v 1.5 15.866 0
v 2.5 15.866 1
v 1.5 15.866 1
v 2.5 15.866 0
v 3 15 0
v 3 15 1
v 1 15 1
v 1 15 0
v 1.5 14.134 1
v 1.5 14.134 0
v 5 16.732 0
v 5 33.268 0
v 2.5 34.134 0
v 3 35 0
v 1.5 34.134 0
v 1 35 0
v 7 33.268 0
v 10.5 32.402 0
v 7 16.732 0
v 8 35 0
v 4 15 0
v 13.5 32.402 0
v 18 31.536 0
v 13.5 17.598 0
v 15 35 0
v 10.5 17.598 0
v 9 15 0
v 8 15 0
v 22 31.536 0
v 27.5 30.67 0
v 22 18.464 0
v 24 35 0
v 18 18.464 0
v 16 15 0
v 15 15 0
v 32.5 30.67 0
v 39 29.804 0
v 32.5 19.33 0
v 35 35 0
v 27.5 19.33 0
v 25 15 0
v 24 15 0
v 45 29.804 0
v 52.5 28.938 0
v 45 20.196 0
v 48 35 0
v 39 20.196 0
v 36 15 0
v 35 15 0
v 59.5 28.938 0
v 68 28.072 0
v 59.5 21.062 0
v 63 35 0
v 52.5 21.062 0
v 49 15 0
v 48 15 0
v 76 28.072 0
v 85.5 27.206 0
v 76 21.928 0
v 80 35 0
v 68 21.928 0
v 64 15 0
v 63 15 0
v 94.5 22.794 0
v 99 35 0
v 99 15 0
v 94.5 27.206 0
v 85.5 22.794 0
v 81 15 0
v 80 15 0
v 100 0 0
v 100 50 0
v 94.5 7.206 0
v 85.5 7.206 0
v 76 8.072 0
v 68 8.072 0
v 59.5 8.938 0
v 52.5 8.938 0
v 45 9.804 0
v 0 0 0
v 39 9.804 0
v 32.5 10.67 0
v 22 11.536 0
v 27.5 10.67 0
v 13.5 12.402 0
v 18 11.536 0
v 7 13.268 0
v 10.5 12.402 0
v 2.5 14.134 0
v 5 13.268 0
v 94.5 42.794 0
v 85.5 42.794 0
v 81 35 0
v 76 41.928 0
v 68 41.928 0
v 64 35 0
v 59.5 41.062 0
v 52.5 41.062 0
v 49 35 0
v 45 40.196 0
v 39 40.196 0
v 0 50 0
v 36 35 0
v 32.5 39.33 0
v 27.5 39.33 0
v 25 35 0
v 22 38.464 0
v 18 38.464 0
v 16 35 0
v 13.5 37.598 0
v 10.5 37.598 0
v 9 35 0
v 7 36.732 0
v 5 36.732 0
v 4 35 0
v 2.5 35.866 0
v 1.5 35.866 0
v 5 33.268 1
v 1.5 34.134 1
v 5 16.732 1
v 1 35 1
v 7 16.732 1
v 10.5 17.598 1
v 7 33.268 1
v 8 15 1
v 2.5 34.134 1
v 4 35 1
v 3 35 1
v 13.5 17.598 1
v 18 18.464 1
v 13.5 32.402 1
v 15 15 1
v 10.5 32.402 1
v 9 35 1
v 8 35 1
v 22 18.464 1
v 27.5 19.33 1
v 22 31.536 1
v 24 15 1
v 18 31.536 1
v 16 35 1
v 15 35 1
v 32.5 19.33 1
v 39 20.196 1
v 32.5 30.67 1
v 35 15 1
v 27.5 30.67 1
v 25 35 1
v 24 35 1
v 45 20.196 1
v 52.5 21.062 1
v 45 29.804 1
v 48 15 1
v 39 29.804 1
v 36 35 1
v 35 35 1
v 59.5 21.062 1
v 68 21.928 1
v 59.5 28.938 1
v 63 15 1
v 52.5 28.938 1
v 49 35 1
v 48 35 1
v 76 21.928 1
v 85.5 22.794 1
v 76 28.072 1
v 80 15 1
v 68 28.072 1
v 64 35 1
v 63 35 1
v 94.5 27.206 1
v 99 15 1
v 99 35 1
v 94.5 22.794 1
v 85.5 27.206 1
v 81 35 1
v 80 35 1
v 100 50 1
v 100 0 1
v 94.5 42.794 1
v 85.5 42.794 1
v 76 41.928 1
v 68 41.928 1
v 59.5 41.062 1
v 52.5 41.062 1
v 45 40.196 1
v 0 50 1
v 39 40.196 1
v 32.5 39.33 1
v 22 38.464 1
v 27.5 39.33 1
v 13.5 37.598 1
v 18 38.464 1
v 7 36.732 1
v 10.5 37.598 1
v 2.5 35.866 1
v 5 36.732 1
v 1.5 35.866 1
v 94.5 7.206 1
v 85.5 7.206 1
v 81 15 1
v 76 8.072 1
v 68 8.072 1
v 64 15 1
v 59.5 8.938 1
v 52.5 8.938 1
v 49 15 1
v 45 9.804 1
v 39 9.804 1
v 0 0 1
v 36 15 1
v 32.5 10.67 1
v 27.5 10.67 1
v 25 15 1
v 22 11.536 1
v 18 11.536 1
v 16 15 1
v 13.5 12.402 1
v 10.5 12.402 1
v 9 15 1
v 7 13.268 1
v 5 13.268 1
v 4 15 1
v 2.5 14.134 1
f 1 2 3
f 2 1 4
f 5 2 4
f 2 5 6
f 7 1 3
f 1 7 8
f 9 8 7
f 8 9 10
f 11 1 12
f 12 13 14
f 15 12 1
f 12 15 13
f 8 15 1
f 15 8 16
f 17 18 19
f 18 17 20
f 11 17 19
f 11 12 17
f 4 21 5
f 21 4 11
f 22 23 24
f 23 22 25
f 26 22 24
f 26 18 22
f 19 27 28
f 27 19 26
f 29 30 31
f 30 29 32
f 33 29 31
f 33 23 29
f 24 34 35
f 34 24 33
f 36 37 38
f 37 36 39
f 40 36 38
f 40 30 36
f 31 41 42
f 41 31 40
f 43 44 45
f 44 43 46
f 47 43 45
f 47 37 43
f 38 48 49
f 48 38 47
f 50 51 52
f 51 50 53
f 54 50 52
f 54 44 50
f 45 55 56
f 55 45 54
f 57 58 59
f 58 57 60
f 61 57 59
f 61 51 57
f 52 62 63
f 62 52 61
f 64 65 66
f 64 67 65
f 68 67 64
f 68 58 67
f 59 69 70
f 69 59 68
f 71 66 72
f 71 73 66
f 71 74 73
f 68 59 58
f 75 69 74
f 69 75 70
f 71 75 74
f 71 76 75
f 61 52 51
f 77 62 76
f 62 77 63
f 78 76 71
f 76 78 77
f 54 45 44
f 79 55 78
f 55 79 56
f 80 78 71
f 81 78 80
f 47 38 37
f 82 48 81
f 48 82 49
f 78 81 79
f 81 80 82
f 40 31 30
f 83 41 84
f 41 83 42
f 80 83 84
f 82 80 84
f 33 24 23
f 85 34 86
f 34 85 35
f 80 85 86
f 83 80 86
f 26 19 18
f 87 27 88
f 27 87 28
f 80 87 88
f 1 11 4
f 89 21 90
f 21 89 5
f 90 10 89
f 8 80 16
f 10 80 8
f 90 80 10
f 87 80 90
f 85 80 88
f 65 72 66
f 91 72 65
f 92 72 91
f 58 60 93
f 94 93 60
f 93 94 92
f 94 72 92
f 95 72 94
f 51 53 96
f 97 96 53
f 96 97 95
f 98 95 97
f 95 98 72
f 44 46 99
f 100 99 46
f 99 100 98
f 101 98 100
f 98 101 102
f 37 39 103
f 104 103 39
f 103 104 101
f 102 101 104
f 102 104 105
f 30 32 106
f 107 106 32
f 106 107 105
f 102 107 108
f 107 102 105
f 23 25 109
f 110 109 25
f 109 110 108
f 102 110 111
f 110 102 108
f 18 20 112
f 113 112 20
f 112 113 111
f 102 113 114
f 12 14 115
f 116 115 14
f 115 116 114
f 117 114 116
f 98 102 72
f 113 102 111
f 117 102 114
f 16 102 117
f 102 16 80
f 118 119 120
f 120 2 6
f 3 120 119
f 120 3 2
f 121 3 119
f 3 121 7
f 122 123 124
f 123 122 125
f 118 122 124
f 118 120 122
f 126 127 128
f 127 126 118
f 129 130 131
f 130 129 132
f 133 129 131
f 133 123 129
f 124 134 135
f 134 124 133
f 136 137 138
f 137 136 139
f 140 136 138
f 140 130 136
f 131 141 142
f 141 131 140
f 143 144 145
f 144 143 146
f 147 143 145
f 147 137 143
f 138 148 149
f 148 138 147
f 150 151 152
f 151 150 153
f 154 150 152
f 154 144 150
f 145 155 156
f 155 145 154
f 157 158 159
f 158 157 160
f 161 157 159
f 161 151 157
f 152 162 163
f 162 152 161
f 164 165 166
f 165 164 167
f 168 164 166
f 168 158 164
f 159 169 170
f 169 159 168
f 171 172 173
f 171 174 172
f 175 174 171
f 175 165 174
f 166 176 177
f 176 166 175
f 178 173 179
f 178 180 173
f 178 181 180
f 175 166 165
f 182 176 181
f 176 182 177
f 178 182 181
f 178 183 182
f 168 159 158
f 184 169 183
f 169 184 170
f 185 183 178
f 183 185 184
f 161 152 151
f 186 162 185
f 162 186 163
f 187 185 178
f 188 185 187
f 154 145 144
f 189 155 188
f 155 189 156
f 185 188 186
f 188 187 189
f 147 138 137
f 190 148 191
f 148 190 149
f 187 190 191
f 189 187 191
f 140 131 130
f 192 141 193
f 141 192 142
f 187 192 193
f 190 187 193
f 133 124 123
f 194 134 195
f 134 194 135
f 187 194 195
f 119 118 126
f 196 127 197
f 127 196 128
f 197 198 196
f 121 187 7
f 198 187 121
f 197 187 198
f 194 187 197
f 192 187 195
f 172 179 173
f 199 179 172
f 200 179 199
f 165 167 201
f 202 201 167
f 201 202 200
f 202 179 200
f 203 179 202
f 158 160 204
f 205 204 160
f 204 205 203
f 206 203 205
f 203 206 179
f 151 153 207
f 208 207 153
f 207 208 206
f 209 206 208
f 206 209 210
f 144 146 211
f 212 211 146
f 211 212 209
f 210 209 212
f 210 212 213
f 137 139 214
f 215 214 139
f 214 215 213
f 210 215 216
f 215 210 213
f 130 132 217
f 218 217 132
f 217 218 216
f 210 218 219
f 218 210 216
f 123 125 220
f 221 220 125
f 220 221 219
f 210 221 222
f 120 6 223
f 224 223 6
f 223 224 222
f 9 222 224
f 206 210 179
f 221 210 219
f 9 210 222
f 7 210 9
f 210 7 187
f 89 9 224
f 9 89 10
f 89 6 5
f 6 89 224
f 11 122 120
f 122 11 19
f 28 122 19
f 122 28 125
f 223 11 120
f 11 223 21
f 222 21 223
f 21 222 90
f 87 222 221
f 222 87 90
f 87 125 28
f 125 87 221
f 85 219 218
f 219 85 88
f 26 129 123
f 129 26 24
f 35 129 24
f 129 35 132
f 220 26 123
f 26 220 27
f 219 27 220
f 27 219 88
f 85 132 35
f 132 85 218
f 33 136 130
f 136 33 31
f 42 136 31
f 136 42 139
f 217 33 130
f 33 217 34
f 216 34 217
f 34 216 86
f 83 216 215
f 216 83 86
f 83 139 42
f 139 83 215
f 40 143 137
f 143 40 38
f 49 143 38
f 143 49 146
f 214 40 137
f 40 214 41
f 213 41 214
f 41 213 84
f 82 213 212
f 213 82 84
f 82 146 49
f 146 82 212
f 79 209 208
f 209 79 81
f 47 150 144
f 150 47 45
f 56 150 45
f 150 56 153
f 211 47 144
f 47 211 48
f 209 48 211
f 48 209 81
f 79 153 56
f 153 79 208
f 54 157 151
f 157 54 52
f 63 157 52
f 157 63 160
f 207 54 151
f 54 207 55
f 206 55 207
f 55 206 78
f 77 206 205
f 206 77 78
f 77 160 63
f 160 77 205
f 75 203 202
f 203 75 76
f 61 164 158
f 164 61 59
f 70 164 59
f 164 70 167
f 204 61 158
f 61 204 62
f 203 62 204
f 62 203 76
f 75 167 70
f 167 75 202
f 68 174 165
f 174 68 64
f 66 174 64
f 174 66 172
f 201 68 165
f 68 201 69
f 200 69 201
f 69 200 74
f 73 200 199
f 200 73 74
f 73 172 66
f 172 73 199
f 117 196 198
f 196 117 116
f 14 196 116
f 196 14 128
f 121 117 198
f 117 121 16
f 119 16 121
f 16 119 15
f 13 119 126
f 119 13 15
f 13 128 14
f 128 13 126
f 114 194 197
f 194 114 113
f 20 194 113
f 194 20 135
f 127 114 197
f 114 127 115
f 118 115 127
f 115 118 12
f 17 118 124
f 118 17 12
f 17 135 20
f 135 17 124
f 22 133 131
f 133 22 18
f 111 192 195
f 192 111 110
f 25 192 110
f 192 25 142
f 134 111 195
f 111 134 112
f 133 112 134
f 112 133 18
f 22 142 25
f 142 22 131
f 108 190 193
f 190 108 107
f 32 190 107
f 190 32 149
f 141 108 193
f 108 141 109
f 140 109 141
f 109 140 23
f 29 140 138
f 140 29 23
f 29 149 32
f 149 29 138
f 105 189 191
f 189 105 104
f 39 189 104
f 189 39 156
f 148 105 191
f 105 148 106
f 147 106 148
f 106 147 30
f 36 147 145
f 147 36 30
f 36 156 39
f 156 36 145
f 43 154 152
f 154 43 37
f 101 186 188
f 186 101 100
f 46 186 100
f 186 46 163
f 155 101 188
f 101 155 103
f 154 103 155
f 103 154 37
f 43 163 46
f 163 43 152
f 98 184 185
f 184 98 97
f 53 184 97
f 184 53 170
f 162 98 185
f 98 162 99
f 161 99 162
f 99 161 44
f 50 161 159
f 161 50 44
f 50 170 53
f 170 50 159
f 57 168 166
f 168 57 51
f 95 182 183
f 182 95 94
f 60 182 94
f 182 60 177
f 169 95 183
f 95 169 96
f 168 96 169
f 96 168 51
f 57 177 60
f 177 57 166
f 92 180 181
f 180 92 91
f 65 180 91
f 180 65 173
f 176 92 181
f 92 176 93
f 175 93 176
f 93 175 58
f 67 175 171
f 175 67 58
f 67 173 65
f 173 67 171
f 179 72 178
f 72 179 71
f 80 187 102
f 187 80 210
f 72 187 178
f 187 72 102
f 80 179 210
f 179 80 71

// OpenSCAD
h = 1;
gap = 1;

difference() {
    cube([100, 50, h]);
    for (o=[0:1]) {
        translate([0, o * 20, 0])
        for (i=[0:9]) {
            translate([i*i + gap * i, 15, 0])
                cylinder(h=h, r1=i, r2=i, $fn=6);
        }
    }
}
